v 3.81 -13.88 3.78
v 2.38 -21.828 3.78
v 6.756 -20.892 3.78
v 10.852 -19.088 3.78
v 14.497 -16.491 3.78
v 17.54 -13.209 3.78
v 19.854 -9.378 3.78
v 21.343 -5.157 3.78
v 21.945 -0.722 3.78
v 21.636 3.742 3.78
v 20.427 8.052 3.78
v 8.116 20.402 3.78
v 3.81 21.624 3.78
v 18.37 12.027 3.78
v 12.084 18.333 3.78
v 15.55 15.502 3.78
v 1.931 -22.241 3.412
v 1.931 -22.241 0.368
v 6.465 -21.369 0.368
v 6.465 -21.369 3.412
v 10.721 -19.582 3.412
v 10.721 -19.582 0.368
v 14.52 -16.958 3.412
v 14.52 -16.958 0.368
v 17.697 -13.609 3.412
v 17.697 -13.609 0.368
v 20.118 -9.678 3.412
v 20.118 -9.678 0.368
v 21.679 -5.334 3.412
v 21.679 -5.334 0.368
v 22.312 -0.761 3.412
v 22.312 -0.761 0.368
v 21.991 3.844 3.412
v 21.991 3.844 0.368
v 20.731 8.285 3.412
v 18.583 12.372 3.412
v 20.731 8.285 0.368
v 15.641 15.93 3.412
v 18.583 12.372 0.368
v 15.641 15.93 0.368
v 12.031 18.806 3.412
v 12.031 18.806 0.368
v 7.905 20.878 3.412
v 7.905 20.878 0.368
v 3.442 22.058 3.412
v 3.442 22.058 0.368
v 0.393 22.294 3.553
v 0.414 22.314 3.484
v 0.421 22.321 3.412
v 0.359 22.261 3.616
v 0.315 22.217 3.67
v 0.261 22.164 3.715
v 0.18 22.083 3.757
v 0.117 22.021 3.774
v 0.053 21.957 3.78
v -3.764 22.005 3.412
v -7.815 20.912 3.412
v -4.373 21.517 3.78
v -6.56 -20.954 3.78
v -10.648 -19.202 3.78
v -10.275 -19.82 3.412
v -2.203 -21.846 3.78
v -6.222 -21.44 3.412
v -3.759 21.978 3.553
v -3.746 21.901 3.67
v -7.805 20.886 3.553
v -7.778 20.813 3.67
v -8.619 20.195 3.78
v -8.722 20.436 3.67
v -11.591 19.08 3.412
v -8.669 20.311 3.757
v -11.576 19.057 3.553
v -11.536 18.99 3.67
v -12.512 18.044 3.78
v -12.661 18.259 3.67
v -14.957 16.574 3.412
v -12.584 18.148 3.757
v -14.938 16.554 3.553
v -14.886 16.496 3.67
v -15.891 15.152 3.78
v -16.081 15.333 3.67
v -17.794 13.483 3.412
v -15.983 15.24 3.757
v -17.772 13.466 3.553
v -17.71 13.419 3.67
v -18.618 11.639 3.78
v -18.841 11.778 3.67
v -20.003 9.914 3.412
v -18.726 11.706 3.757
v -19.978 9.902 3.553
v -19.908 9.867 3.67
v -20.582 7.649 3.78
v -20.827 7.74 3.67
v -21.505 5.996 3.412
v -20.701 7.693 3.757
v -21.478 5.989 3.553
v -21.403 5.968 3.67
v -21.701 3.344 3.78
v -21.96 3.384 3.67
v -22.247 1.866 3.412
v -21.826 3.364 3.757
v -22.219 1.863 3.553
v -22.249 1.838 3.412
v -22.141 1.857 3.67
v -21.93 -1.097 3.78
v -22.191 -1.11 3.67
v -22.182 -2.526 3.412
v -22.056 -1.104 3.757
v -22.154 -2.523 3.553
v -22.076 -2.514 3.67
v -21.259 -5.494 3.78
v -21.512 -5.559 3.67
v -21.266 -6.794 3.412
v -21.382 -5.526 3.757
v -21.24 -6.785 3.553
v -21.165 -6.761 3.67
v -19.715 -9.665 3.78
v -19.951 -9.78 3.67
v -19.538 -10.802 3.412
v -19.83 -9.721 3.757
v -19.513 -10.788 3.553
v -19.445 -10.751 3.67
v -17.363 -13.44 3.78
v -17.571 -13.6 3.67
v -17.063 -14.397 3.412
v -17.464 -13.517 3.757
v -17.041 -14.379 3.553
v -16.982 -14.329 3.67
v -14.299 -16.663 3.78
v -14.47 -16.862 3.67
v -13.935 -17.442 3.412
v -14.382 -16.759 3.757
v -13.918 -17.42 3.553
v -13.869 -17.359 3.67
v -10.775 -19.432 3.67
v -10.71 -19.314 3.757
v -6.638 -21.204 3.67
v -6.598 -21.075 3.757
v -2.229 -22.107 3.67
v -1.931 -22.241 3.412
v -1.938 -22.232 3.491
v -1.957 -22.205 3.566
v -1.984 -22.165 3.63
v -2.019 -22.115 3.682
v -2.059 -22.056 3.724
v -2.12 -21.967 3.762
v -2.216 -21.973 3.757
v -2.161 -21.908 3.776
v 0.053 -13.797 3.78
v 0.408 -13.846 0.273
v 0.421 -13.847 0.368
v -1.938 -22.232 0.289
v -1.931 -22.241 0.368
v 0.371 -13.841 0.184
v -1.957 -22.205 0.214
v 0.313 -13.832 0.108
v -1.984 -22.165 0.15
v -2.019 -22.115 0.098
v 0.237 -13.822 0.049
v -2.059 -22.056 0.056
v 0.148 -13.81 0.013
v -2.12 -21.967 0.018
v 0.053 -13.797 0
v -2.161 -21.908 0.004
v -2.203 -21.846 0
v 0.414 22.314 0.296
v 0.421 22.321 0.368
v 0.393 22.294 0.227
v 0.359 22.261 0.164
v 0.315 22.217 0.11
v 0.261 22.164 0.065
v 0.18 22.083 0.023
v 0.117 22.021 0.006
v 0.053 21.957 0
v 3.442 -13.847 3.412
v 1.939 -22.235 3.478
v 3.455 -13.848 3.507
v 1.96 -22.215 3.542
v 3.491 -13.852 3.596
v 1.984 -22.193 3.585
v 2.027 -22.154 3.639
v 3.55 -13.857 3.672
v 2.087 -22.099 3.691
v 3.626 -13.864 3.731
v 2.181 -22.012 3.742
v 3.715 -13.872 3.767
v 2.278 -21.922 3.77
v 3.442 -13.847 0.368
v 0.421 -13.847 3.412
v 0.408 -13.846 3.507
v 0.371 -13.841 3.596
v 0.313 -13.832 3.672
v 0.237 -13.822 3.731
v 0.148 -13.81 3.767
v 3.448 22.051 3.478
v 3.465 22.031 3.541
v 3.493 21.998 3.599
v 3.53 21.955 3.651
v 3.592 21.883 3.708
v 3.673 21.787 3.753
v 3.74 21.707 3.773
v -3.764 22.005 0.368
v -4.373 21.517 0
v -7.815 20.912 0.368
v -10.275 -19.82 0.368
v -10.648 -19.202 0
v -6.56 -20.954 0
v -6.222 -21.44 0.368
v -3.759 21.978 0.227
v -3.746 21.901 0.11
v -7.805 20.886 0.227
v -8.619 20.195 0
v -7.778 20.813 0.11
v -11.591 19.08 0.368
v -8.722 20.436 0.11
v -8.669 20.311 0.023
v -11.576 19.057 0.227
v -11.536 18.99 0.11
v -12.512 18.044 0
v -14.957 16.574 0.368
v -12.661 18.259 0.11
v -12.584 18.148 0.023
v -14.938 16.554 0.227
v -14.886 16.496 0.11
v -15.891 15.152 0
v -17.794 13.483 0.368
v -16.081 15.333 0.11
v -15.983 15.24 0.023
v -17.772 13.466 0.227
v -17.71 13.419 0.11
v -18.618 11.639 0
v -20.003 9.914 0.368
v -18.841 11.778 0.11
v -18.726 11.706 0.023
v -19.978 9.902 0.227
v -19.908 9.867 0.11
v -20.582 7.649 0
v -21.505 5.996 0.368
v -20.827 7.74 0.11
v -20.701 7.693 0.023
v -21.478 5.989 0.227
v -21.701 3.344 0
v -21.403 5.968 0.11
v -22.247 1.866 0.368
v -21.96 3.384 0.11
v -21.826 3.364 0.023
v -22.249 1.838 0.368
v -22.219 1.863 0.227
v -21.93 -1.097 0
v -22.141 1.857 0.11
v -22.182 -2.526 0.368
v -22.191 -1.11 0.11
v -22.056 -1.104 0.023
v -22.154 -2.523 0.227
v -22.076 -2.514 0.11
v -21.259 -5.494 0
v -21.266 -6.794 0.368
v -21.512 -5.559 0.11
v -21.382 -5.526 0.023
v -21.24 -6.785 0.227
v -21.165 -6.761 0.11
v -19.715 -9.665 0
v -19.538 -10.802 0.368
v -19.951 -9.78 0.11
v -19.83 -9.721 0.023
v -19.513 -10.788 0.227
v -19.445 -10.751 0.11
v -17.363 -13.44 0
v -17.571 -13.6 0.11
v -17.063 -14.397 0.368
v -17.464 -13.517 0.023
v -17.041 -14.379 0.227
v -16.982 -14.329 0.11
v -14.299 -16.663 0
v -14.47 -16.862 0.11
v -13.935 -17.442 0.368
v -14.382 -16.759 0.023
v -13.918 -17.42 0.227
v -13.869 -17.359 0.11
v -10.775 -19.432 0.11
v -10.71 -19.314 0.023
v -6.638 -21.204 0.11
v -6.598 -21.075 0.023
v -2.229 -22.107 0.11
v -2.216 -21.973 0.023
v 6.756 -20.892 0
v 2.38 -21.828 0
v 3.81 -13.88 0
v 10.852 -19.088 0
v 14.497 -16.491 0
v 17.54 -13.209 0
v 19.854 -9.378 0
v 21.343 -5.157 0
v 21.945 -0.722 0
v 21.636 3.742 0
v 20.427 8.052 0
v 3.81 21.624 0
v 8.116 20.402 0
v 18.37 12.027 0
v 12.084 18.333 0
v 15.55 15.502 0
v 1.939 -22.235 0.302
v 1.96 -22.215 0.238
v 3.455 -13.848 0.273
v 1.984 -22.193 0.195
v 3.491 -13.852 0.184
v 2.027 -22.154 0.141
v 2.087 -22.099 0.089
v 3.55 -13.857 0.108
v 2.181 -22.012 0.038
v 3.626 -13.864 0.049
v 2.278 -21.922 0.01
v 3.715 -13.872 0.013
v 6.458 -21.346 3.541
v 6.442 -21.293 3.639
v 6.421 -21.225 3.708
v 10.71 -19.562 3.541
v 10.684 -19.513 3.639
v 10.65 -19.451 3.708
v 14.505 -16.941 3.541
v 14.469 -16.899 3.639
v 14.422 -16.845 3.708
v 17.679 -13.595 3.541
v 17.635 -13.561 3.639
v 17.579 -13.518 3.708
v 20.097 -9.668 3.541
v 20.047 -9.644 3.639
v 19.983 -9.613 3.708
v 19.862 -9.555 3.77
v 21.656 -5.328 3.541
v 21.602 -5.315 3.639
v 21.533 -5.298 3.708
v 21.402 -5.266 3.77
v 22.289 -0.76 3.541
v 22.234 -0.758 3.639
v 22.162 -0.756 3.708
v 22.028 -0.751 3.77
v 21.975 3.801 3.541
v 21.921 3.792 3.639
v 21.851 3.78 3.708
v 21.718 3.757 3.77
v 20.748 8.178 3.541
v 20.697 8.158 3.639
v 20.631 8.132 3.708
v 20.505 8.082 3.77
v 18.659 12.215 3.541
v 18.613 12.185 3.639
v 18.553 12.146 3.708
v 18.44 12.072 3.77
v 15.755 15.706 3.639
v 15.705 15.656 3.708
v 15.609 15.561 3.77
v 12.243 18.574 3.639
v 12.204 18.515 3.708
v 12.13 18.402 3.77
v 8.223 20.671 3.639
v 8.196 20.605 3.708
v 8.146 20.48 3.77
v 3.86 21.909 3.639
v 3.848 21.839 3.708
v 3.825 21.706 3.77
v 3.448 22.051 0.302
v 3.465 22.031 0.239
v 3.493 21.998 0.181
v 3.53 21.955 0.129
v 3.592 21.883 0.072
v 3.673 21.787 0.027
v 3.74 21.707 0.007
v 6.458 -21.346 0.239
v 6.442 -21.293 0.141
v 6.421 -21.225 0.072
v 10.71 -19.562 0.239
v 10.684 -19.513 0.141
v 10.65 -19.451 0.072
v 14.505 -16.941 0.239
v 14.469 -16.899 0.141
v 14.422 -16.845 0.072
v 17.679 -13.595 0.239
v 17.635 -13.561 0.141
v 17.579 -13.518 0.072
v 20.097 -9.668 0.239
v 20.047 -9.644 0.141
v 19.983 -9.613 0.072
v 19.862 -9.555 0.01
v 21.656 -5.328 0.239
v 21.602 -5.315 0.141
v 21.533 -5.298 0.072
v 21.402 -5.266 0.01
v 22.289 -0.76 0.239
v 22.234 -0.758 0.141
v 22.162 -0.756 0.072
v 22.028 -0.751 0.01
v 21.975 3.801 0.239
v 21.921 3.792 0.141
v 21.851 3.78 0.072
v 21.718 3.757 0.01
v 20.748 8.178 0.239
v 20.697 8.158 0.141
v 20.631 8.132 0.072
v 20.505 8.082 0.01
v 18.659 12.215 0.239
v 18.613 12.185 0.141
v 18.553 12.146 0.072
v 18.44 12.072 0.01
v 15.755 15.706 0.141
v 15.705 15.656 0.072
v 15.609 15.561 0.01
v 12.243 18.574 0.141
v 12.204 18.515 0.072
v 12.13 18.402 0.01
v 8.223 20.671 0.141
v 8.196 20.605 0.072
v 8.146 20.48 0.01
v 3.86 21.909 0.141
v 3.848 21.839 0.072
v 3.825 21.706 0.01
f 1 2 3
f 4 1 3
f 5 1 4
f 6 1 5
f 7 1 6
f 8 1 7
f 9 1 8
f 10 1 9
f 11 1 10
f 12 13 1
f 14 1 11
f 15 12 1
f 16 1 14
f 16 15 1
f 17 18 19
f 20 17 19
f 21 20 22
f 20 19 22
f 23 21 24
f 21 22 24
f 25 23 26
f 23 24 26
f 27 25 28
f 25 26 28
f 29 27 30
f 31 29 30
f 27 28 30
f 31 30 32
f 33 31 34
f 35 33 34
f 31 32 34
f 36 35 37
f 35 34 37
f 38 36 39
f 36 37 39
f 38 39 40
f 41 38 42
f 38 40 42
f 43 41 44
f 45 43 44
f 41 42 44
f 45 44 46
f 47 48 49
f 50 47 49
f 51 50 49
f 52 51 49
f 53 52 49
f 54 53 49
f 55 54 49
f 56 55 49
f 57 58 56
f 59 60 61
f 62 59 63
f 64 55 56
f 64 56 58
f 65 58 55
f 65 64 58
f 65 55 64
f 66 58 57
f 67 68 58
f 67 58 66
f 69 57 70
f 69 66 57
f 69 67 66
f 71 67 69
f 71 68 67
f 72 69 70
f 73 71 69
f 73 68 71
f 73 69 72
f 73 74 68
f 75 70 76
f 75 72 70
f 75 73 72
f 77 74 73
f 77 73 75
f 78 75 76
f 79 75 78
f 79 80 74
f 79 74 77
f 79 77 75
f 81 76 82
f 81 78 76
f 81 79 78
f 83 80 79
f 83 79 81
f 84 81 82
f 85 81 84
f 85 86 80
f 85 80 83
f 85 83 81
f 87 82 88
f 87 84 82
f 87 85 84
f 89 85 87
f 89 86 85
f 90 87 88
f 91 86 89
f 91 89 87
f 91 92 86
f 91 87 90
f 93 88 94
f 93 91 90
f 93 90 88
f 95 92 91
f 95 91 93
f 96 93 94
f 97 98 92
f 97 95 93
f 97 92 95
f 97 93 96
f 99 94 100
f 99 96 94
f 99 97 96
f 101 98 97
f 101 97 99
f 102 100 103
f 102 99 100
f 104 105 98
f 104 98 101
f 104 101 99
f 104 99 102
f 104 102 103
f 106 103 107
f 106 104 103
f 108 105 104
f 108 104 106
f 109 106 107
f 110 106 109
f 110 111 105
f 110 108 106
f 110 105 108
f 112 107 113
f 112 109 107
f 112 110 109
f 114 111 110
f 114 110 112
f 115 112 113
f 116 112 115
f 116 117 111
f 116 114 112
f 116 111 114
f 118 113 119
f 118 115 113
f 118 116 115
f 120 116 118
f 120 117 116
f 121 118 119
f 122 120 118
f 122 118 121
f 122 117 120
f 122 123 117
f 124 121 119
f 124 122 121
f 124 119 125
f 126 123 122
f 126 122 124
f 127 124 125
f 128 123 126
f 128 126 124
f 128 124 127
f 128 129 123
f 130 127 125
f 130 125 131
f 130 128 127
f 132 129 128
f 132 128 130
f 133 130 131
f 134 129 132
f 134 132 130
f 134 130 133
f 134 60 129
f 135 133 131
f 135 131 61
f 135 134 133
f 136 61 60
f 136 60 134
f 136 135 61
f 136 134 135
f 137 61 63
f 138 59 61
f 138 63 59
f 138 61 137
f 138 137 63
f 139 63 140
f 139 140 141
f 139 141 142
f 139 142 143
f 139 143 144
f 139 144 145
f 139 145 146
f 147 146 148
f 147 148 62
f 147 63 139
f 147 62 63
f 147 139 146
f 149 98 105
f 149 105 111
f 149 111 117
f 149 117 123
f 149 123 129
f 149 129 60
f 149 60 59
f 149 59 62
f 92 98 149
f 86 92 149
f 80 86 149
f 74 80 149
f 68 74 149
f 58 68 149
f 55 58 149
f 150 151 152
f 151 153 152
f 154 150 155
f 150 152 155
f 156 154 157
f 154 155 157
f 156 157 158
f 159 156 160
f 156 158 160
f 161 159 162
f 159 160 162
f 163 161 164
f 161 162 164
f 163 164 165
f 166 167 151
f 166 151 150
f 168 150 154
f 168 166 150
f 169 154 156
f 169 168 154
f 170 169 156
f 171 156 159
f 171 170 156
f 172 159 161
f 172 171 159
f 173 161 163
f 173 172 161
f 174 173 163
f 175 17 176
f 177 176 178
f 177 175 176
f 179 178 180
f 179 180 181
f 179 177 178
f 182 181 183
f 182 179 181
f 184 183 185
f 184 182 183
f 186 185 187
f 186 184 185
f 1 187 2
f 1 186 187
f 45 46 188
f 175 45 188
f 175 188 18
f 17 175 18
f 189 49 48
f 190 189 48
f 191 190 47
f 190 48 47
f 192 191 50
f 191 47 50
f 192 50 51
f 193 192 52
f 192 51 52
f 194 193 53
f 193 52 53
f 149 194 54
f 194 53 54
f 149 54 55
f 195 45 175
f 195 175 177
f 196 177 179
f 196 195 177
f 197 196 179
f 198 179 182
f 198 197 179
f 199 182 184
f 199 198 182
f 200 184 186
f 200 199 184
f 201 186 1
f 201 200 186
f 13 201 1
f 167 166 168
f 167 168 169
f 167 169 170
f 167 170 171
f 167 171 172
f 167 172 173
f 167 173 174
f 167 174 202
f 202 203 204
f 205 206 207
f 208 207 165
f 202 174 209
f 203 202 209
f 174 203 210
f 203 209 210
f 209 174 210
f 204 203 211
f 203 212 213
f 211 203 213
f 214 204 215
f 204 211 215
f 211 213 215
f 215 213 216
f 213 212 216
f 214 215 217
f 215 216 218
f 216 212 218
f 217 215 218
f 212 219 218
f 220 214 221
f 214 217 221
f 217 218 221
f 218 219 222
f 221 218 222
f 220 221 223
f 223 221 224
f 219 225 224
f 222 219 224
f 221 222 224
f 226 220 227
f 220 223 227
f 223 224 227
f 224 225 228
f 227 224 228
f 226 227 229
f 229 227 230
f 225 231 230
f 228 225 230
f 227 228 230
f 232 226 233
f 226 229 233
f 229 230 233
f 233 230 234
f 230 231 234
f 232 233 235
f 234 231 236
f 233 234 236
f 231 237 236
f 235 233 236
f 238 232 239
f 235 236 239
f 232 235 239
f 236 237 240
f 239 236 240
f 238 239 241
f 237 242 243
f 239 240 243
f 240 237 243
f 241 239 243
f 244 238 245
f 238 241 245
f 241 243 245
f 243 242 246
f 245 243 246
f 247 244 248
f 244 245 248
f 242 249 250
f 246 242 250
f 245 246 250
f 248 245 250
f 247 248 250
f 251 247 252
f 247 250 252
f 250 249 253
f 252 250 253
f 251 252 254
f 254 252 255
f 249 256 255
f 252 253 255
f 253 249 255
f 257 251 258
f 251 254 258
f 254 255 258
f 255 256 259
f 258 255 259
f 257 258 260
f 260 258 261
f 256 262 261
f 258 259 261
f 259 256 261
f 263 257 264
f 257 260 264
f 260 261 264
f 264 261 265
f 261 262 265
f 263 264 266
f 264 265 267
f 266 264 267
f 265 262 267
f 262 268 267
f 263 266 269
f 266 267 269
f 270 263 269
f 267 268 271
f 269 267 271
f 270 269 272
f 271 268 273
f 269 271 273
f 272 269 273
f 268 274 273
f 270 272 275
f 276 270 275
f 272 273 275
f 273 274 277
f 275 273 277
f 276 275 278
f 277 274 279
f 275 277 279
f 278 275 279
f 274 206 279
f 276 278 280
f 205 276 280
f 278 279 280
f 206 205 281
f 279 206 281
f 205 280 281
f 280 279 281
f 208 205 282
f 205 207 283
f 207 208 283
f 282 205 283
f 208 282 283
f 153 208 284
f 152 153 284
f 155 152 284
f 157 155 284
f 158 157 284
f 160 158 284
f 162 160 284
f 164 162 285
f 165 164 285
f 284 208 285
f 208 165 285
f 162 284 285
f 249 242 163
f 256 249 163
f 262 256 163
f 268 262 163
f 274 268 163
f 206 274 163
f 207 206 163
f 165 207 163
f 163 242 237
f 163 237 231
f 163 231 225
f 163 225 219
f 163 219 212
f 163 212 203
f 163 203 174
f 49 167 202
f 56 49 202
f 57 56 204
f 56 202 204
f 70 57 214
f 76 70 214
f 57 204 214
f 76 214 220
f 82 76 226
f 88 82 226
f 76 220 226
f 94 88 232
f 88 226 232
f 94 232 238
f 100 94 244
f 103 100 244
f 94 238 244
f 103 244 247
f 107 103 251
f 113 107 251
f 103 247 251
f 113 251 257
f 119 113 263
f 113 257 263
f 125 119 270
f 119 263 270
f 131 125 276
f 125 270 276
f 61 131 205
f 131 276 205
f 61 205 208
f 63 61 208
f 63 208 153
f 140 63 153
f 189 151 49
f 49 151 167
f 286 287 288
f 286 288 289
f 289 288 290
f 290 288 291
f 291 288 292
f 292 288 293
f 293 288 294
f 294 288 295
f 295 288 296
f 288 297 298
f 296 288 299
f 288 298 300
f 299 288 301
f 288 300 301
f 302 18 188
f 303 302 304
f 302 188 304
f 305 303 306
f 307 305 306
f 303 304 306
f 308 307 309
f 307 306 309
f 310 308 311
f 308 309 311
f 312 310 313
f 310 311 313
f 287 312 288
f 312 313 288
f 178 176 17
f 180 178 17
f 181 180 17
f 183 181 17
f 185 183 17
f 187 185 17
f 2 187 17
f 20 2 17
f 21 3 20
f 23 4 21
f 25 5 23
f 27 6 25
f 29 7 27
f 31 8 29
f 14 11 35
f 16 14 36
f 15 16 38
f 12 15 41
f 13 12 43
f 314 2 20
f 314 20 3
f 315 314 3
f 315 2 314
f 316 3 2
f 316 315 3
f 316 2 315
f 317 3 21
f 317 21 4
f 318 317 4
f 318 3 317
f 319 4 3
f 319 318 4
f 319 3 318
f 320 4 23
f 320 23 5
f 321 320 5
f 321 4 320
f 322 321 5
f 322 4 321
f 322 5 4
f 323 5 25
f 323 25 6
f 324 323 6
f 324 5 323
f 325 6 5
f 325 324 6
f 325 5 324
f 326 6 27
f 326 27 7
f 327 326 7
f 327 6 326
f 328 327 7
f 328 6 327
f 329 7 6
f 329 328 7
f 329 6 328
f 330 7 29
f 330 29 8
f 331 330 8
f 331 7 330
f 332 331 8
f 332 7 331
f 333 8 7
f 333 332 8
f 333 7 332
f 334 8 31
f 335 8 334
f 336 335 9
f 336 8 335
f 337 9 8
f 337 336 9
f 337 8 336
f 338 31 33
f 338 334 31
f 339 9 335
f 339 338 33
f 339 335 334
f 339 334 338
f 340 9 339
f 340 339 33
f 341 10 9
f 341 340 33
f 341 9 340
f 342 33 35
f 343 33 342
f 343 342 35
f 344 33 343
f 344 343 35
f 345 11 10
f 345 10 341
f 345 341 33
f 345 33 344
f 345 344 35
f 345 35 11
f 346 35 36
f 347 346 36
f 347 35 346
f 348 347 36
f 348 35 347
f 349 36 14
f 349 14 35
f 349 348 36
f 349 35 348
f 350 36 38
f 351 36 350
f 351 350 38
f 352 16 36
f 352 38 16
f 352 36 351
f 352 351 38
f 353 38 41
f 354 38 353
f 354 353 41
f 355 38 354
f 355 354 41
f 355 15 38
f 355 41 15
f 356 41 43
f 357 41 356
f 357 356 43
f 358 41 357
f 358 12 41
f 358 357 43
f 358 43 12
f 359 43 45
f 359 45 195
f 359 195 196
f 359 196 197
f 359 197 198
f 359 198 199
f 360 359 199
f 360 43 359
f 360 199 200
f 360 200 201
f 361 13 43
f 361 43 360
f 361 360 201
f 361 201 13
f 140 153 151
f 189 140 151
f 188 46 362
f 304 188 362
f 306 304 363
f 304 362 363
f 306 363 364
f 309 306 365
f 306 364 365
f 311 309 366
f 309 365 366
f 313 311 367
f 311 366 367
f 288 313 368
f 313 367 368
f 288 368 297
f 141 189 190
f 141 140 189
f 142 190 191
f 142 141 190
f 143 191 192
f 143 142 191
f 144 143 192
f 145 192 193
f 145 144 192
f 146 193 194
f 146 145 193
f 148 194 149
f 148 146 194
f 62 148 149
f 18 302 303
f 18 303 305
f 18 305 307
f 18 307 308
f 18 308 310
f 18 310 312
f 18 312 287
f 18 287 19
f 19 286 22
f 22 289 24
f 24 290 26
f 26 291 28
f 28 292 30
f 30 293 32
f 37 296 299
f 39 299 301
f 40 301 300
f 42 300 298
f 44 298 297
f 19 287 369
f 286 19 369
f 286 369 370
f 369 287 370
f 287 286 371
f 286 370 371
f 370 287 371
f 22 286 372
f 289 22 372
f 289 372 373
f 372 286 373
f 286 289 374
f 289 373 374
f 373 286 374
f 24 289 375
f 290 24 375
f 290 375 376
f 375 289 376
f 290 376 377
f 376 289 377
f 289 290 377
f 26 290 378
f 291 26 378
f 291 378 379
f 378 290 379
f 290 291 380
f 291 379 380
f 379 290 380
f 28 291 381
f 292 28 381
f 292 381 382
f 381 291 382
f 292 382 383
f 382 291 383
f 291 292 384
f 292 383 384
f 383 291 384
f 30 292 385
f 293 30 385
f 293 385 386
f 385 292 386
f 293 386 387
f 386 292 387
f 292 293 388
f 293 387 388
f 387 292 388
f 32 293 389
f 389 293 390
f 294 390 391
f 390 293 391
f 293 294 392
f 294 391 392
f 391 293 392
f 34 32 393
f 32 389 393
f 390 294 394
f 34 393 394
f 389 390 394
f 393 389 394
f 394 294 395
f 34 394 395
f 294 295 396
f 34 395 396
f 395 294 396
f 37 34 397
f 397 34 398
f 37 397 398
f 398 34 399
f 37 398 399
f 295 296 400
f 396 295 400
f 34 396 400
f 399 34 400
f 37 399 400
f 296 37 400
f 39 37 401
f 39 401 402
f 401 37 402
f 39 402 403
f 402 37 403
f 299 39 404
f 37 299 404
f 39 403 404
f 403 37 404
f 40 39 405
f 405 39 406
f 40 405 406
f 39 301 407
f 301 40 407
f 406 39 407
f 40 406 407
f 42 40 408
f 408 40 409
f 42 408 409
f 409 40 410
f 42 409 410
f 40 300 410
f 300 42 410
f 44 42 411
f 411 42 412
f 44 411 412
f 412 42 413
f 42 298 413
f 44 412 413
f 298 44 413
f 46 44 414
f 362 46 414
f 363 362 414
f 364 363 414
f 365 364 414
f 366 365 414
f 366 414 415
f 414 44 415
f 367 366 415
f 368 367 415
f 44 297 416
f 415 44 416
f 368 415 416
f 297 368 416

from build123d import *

# Parameters (mm, degrees)
F1_DEPTH      = 3.78
F2_T4_DEPTH   = 40.3204423055
F2_T9_DEPTH   = 12.9439682299
F2_T14_DEPTH  = 12.9439682299
F2_T19_DEPTH  = 40.3204423055
F2_T22_ANGLE  = 177.5138742153
F2_T24_ANGLE  = 177.5138742153
F2_T29_DEPTH  = 40.3204423055
F2_T33_DEPTH  = 12.9439682299
F2_T40_DEPTH  = 40.3204423055
F2_T44_DEPTH  = 12.9439682299
F2_2_T1_DEPTH = 38.6518237684
F2_2_T3_DEPTH = 11.2008796601
F2_2_T6_ANGLE = 180.8453878552
F2_2_T8_ANGLE = 180.8453878552


# Not quite as in the source:
# - a fillet or chamfer that OpenCascade refuses, or shapes differently, is made with other operations: its cross-section is extruded or revolved along the edge and cut away or added


with BuildPart() as f1:
    # F0 (on Top) → F1 (new body)
    with BuildSketch(Plane.XY):
        with BuildLine():
            Line((3.4421672434, -13.8472889727), (1.9314982338, -22.2412890717))
            ThreePointArc((1.9314982338, -22.2412890717), (22.3120303803, -0.7608714143), (3.4421672434, 22.0580395699))
            Line((3.4421672434, 22.0580395699), (3.4421672434, -13.8472889727))
        make_face()
    extrude(amount=F1_DEPTH)

    # F2: fillet of radius 0.3679261469 on 6 edges, made by hand


with BuildPart() as f1b:
    # F0 (on Top) → F1, piece 2 (new body)
    with BuildSketch(Plane.XY):
        with BuildLine():
            Line((0.4208292241, -13.8472889727), (0.4208292241, 22.3210333041))
            ThreePointArc((0.4208292241, 22.3210333041), (-22.2939604848, 1.1768393701), (-1.9314982338, -22.2412890717))
            Line((-1.9314982338, -22.2412890717), (0.4208292241, -13.8472889727))
        make_face()
    extrude(amount=F1_DEPTH)

    # F2#2: fillet of radius 0.3679261469 on 6 edges, made by hand

    # F2_2_s2 → F2_2_t1 (cut)
    with BuildSketch(Plane.XZ.offset(-23.2408486714)):
        with BuildLine():
            ThreePointArc((0.4208292241, 3.4120738531), (0.3130661507, 3.6722369265), (0.0529030772, 3.78))
            Line((0.0529030772, 3.78), (0.4208292241, 3.78))
            Line((0.4208292241, 3.78), (0.4208292241, 3.4120738531))
        make_face()
        with BuildLine():
            ThreePointArc((0.4208292241, 0.3679261469), (0.3130661507, 0.1077630735), (0.0529030772, 0))
            Line((0.0529030772, 0), (0.4208292241, 0))
            Line((0.4208292241, 0), (0.4208292241, 0.3679261469))
        make_face()
    extrude(amount=F2_2_T1_DEPTH, mode=Mode.SUBTRACT)

    # F2_2_s4 → F2_2_t3 (cut)
    with BuildSketch(Plane(origin=(-6.1678788932, -22.0093405225, 0), x_dir=(0, 0, 1), z_dir=(0.2698434566, 0.9629042055, 0))):
        with BuildLine():
            ThreePointArc((3.4120738531, 4.1418185513), (3.6722369265, 4.0340554778), (3.78, 3.7738924044))
            Line((3.78, 3.7738924044), (3.78, 4.1418185513))
            Line((3.78, 4.1418185513), (3.4120738531, 4.1418185513))
        make_face()
        with BuildLine():
            ThreePointArc((0.3679261469, 4.1418185513), (0.1077630735, 4.0340554778), (0, 3.7738924044))
            Line((0, 3.7738924044), (0, 4.1418185513))
            Line((0, 4.1418185513), (0.3679261469, 4.1418185513))
        make_face()
    extrude(amount=F2_2_T3_DEPTH, mode=Mode.SUBTRACT)

    # F2_2_s5 → F2_2_t6 (revolve, cut)
    with BuildSketch(Plane(origin=(0, 0, 0), x_dir=(0, 0, 1), z_dir=(0.9981935886, -0.0600796118, 0))):
        with BuildLine():
            ThreePointArc((3.4120738531, -22.325), (3.6722369265, -22.2172369265), (3.78, -21.9570738531))
            Line((3.78, -21.9570738531), (3.78, -22.325))
            Line((3.78, -22.325), (3.4120738531, -22.325))
        make_face()
    revolve(axis=Axis((0, 0, 3.78), (0, 0, 1)), revolution_arc=F2_2_T6_ANGLE, mode=Mode.SUBTRACT)

    # F2_2_s7 → F2_2_t8 (revolve, cut)
    with BuildSketch(Plane(origin=(0, 0, 0), x_dir=(0, 0, 1), z_dir=(0.9981935886, -0.0600796118, 0))):
        with BuildLine():
            ThreePointArc((0.3679261469, -22.325), (0.1077630735, -22.2172369265), (0, -21.9570738531))
            Line((0, -21.9570738531), (0, -22.325))
            Line((0, -22.325), (0.3679261469, -22.325))
        make_face()
    revolve(axis=Axis((0, 0, 0), (0, 0, 1)), revolution_arc=F2_2_T8_ANGLE, mode=Mode.SUBTRACT)


with BuildPart() as f2_tool2:
    # F2_s3 → F2_t4 (new body)
    with BuildSketch(Plane.XZ.offset(-24.2655964514)):
        with BuildLine():
            ThreePointArc((3.4421672434, 3.4120738531), (3.5499303169, 3.6722369265), (3.8100933903, 3.78))
            Line((3.8100933903, 3.78), (3.8100933903, 3.7873585229))
            Line((3.8100933903, 3.7873585229), (3.4348087205, 3.7873585229))
            Line((3.4348087205, 3.7873585229), (3.4348087205, 3.4120738531))
            Line((3.4348087205, 3.4120738531), (3.4421672434, 3.4120738531))
        make_face()
    extrude(amount=F2_T4_DEPTH)

    split(bisect_by=Plane(origin=(5.7480889705, -1.0344841279, 0), x_dir=(0, 0, 1), z_dir=(-0.9841884548, 0.1771244914, 0)), keep=Keep.TOP)


with BuildPart() as f1_1:
    add(f1.part)

    # F2_t1: cut F2_tool2
    add(f2_tool2.part, mode=Mode.SUBTRACT)


with BuildPart() as f2_tool7:
    # F2_s8 → F2_t9 (new body)
    with BuildSketch(Plane(origin=(-1.9149093372, -10.6401528487, 0), x_dir=(0, 0, 1), z_dir=(-0.1771244914, -0.9841884548, 0))):
        with BuildLine():
            ThreePointArc((3.4120738531, -5.8404352769), (3.6722369265, -5.9481983504), (3.78, -6.2083614238))
            Line((3.78, -6.2083614238), (3.7873585229, -6.2083614238))
            Line((3.7873585229, -6.2083614238), (3.7873585229, -5.833076754))
            Line((3.7873585229, -5.833076754), (3.4120738531, -5.833076754))
            Line((3.4120738531, -5.833076754), (3.4120738531, -5.8404352769))
        make_face()
    extrude(amount=F2_T9_DEPTH)

    split(bisect_by=Plane.YZ.offset(3.4421672434), keep=Keep.BOTTOM)


with BuildPart() as f1_2:
    add(f1_1.part)

    # F2_t6: cut F2_tool7
    add(f2_tool7.part, mode=Mode.SUBTRACT)


with BuildPart() as f2_tool12:
    # F2_s13 → F2_t14 (new body)
    with BuildSketch(Plane(origin=(-1.9149093372, -10.6401528487, 0), x_dir=(0, 0, 1), z_dir=(-0.1771244914, -0.9841884548, 0))):
        with BuildLine():
            ThreePointArc((0.3679261469, -5.8404352769), (0.1077630735, -5.9481983504), (0, -6.2083614238))
            Line((0, -6.2083614238), (-0.0073585229, -6.2083614238))
            Line((-0.0073585229, -6.2083614238), (-0.0073585229, -5.833076754))
            Line((-0.0073585229, -5.833076754), (0.3679261469, -5.833076754))
            Line((0.3679261469, -5.833076754), (0.3679261469, -5.8404352769))
        make_face()
    extrude(amount=F2_T14_DEPTH)

    split(bisect_by=Plane.YZ.offset(3.4421672434), keep=Keep.BOTTOM)


with BuildPart() as f1_3:
    add(f1_2.part)

    # F2_t11: cut F2_tool12
    add(f2_tool12.part, mode=Mode.SUBTRACT)


with BuildPart() as f2_tool17:
    # F2_s18 → F2_t19 (new body)
    with BuildSketch(Plane.XZ.offset(-24.2655964514)):
        with BuildLine():
            ThreePointArc((3.4421672434, 0.3679261469), (3.5499303169, 0.1077630735), (3.8100933903, 0))
            Line((3.8100933903, 0), (3.8100933903, -0.0073585229))
            Line((3.8100933903, -0.0073585229), (3.4348087205, -0.0073585229))
            Line((3.4348087205, -0.0073585229), (3.4348087205, 0.3679261469))
            Line((3.4348087205, 0.3679261469), (3.4421672434, 0.3679261469))
        make_face()
    extrude(amount=F2_T19_DEPTH)

    split(bisect_by=Plane(origin=(5.7480889705, -1.0344841279, 0), x_dir=(0, 0, 1), z_dir=(-0.9841884548, 0.1771244914, 0)), keep=Keep.TOP)


with BuildPart() as f1_4:
    add(f1_3.part)

    # F2_t16: cut F2_tool17
    add(f2_tool17.part, mode=Mode.SUBTRACT)

    # F2_s21 → F2_t22 (revolve, cut)
    with BuildSketch(Plane(origin=(0, 0, 0), x_dir=(0, 0, 1), z_dir=(-0.9999232121, 0.0123923302, 0))):
        with BuildLine():
            ThreePointArc((0.3679261469, -22.325), (0.1077630735, -22.2172369265), (0, -21.9570738531))
            Line((0, -21.9570738531), (-0.0073585229, -21.9570738531))
            Line((-0.0073585229, -21.9570738531), (-0.0073585229, -22.3323585229))
            Line((-0.0073585229, -22.3323585229), (0.3679261469, -22.3323585229))
            Line((0.3679261469, -22.3323585229), (0.3679261469, -22.325))
        make_face()
    revolve(axis=Axis((0, 0, 0), (0, 0, 1)), revolution_arc=F2_T22_ANGLE, mode=Mode.SUBTRACT)

    # F2_s23 → F2_t24 (revolve, cut)
    with BuildSketch(Plane(origin=(0, 0, 0), x_dir=(0, 0, 1), z_dir=(-0.9999232121, 0.0123923302, 0))):
        with BuildLine():
            ThreePointArc((3.4120738531, -22.325), (3.6722369265, -22.2172369265), (3.78, -21.9570738531))
            Line((3.78, -21.9570738531), (3.7873585229, -21.9570738531))
            Line((3.7873585229, -21.9570738531), (3.7873585229, -22.3323585229))
            Line((3.7873585229, -22.3323585229), (3.4120738531, -22.3323585229))
            Line((3.4120738531, -22.3323585229), (3.4120738531, -22.325))
        make_face()
    revolve(axis=Axis((0, 0, 3.78), (0, 0, 1)), revolution_arc=F2_T24_ANGLE, mode=Mode.SUBTRACT)


with BuildPart() as f2_tool27:
    # F2_s28 → F2_t29 (new body)
    with BuildSketch(Plane.XZ.offset(-24.2655964514)):
        with BuildLine():
            ThreePointArc((3.4421672434, 3.4120738531), (3.5499303169, 3.6722369265), (3.8100933903, 3.78))
            Line((3.8100933903, 3.78), (3.8100933903, 3.7873585229))
            Line((3.8100933903, 3.7873585229), (3.4348087205, 3.7873585229))
            Line((3.4348087205, 3.7873585229), (3.4348087205, 3.4120738531))
            Line((3.4348087205, 3.4120738531), (3.4421672434, 3.4120738531))
        make_face()
    extrude(amount=F2_T29_DEPTH)

    split(bisect_by=Plane(origin=(5.7480889705, -1.0344841279, 0), x_dir=(0, 0, 1), z_dir=(0.9841884548, -0.1771244914, 0)), keep=Keep.TOP)


with BuildPart() as f2_tool31:
    # F2_s32 → F2_t33 (new body)
    with BuildSketch(Plane(origin=(-1.9149093372, -10.6401528487, 0), x_dir=(0, 0, 1), z_dir=(-0.1771244914, -0.9841884548, 0))):
        with BuildLine():
            ThreePointArc((3.4120738531, -5.8404352769), (3.6722369265, -5.9481983504), (3.78, -6.2083614238))
            Line((3.78, -6.2083614238), (3.7873585229, -6.2083614238))
            Line((3.7873585229, -6.2083614238), (3.7873585229, -5.833076754))
            Line((3.7873585229, -5.833076754), (3.4120738531, -5.833076754))
            Line((3.4120738531, -5.833076754), (3.4120738531, -5.8404352769))
        make_face()
    extrude(amount=F2_T33_DEPTH)

    split(bisect_by=Plane.YZ.offset(3.4421672434), keep=Keep.TOP)


with BuildPart() as f2_tool27_1:
    add(f2_tool27.part)

    # F2_t35: intersect F2_tool31
    add(f2_tool31.part, mode=Mode.INTERSECT)


with BuildPart() as f1_5:
    add(f1_4.part)

    # F2_t25: cut F2_tool27
    add(f2_tool27_1.part, mode=Mode.SUBTRACT)


with BuildPart() as f2_tool38:
    # F2_s39 → F2_t40 (new body)
    with BuildSketch(Plane.XZ.offset(-24.2655964514)):
        with BuildLine():
            ThreePointArc((3.4421672434, 0.3679261469), (3.5499303169, 0.1077630735), (3.8100933903, 0))
            Line((3.8100933903, 0), (3.8100933903, -0.0073585229))
            Line((3.8100933903, -0.0073585229), (3.4348087205, -0.0073585229))
            Line((3.4348087205, -0.0073585229), (3.4348087205, 0.3679261469))
            Line((3.4348087205, 0.3679261469), (3.4421672434, 0.3679261469))
        make_face()
    extrude(amount=F2_T40_DEPTH)

    split(bisect_by=Plane(origin=(5.7480889705, -1.0344841279, 0), x_dir=(0, 0, 1), z_dir=(0.9841884548, -0.1771244914, 0)), keep=Keep.TOP)


with BuildPart() as f2_tool42:
    # F2_s43 → F2_t44 (new body)
    with BuildSketch(Plane(origin=(-1.9149093372, -10.6401528487, 0), x_dir=(0, 0, 1), z_dir=(-0.1771244914, -0.9841884548, 0))):
        with BuildLine():
            ThreePointArc((0.3679261469, -5.8404352769), (0.1077630735, -5.9481983504), (0, -6.2083614238))
            Line((0, -6.2083614238), (-0.0073585229, -6.2083614238))
            Line((-0.0073585229, -6.2083614238), (-0.0073585229, -5.833076754))
            Line((-0.0073585229, -5.833076754), (0.3679261469, -5.833076754))
            Line((0.3679261469, -5.833076754), (0.3679261469, -5.8404352769))
        make_face()
    extrude(amount=F2_T44_DEPTH)

    split(bisect_by=Plane.YZ.offset(3.4421672434), keep=Keep.TOP)


with BuildPart() as f2_tool38_1:
    add(f2_tool38.part)

    # F2_t46: intersect F2_tool42
    add(f2_tool42.part, mode=Mode.INTERSECT)


with BuildPart() as f1_6:
    add(f1_5.part)

    # F2_t36: cut F2_tool38
    add(f2_tool38_1.part, mode=Mode.SUBTRACT)


solid = Compound([f1b.part, f1_6.part])
